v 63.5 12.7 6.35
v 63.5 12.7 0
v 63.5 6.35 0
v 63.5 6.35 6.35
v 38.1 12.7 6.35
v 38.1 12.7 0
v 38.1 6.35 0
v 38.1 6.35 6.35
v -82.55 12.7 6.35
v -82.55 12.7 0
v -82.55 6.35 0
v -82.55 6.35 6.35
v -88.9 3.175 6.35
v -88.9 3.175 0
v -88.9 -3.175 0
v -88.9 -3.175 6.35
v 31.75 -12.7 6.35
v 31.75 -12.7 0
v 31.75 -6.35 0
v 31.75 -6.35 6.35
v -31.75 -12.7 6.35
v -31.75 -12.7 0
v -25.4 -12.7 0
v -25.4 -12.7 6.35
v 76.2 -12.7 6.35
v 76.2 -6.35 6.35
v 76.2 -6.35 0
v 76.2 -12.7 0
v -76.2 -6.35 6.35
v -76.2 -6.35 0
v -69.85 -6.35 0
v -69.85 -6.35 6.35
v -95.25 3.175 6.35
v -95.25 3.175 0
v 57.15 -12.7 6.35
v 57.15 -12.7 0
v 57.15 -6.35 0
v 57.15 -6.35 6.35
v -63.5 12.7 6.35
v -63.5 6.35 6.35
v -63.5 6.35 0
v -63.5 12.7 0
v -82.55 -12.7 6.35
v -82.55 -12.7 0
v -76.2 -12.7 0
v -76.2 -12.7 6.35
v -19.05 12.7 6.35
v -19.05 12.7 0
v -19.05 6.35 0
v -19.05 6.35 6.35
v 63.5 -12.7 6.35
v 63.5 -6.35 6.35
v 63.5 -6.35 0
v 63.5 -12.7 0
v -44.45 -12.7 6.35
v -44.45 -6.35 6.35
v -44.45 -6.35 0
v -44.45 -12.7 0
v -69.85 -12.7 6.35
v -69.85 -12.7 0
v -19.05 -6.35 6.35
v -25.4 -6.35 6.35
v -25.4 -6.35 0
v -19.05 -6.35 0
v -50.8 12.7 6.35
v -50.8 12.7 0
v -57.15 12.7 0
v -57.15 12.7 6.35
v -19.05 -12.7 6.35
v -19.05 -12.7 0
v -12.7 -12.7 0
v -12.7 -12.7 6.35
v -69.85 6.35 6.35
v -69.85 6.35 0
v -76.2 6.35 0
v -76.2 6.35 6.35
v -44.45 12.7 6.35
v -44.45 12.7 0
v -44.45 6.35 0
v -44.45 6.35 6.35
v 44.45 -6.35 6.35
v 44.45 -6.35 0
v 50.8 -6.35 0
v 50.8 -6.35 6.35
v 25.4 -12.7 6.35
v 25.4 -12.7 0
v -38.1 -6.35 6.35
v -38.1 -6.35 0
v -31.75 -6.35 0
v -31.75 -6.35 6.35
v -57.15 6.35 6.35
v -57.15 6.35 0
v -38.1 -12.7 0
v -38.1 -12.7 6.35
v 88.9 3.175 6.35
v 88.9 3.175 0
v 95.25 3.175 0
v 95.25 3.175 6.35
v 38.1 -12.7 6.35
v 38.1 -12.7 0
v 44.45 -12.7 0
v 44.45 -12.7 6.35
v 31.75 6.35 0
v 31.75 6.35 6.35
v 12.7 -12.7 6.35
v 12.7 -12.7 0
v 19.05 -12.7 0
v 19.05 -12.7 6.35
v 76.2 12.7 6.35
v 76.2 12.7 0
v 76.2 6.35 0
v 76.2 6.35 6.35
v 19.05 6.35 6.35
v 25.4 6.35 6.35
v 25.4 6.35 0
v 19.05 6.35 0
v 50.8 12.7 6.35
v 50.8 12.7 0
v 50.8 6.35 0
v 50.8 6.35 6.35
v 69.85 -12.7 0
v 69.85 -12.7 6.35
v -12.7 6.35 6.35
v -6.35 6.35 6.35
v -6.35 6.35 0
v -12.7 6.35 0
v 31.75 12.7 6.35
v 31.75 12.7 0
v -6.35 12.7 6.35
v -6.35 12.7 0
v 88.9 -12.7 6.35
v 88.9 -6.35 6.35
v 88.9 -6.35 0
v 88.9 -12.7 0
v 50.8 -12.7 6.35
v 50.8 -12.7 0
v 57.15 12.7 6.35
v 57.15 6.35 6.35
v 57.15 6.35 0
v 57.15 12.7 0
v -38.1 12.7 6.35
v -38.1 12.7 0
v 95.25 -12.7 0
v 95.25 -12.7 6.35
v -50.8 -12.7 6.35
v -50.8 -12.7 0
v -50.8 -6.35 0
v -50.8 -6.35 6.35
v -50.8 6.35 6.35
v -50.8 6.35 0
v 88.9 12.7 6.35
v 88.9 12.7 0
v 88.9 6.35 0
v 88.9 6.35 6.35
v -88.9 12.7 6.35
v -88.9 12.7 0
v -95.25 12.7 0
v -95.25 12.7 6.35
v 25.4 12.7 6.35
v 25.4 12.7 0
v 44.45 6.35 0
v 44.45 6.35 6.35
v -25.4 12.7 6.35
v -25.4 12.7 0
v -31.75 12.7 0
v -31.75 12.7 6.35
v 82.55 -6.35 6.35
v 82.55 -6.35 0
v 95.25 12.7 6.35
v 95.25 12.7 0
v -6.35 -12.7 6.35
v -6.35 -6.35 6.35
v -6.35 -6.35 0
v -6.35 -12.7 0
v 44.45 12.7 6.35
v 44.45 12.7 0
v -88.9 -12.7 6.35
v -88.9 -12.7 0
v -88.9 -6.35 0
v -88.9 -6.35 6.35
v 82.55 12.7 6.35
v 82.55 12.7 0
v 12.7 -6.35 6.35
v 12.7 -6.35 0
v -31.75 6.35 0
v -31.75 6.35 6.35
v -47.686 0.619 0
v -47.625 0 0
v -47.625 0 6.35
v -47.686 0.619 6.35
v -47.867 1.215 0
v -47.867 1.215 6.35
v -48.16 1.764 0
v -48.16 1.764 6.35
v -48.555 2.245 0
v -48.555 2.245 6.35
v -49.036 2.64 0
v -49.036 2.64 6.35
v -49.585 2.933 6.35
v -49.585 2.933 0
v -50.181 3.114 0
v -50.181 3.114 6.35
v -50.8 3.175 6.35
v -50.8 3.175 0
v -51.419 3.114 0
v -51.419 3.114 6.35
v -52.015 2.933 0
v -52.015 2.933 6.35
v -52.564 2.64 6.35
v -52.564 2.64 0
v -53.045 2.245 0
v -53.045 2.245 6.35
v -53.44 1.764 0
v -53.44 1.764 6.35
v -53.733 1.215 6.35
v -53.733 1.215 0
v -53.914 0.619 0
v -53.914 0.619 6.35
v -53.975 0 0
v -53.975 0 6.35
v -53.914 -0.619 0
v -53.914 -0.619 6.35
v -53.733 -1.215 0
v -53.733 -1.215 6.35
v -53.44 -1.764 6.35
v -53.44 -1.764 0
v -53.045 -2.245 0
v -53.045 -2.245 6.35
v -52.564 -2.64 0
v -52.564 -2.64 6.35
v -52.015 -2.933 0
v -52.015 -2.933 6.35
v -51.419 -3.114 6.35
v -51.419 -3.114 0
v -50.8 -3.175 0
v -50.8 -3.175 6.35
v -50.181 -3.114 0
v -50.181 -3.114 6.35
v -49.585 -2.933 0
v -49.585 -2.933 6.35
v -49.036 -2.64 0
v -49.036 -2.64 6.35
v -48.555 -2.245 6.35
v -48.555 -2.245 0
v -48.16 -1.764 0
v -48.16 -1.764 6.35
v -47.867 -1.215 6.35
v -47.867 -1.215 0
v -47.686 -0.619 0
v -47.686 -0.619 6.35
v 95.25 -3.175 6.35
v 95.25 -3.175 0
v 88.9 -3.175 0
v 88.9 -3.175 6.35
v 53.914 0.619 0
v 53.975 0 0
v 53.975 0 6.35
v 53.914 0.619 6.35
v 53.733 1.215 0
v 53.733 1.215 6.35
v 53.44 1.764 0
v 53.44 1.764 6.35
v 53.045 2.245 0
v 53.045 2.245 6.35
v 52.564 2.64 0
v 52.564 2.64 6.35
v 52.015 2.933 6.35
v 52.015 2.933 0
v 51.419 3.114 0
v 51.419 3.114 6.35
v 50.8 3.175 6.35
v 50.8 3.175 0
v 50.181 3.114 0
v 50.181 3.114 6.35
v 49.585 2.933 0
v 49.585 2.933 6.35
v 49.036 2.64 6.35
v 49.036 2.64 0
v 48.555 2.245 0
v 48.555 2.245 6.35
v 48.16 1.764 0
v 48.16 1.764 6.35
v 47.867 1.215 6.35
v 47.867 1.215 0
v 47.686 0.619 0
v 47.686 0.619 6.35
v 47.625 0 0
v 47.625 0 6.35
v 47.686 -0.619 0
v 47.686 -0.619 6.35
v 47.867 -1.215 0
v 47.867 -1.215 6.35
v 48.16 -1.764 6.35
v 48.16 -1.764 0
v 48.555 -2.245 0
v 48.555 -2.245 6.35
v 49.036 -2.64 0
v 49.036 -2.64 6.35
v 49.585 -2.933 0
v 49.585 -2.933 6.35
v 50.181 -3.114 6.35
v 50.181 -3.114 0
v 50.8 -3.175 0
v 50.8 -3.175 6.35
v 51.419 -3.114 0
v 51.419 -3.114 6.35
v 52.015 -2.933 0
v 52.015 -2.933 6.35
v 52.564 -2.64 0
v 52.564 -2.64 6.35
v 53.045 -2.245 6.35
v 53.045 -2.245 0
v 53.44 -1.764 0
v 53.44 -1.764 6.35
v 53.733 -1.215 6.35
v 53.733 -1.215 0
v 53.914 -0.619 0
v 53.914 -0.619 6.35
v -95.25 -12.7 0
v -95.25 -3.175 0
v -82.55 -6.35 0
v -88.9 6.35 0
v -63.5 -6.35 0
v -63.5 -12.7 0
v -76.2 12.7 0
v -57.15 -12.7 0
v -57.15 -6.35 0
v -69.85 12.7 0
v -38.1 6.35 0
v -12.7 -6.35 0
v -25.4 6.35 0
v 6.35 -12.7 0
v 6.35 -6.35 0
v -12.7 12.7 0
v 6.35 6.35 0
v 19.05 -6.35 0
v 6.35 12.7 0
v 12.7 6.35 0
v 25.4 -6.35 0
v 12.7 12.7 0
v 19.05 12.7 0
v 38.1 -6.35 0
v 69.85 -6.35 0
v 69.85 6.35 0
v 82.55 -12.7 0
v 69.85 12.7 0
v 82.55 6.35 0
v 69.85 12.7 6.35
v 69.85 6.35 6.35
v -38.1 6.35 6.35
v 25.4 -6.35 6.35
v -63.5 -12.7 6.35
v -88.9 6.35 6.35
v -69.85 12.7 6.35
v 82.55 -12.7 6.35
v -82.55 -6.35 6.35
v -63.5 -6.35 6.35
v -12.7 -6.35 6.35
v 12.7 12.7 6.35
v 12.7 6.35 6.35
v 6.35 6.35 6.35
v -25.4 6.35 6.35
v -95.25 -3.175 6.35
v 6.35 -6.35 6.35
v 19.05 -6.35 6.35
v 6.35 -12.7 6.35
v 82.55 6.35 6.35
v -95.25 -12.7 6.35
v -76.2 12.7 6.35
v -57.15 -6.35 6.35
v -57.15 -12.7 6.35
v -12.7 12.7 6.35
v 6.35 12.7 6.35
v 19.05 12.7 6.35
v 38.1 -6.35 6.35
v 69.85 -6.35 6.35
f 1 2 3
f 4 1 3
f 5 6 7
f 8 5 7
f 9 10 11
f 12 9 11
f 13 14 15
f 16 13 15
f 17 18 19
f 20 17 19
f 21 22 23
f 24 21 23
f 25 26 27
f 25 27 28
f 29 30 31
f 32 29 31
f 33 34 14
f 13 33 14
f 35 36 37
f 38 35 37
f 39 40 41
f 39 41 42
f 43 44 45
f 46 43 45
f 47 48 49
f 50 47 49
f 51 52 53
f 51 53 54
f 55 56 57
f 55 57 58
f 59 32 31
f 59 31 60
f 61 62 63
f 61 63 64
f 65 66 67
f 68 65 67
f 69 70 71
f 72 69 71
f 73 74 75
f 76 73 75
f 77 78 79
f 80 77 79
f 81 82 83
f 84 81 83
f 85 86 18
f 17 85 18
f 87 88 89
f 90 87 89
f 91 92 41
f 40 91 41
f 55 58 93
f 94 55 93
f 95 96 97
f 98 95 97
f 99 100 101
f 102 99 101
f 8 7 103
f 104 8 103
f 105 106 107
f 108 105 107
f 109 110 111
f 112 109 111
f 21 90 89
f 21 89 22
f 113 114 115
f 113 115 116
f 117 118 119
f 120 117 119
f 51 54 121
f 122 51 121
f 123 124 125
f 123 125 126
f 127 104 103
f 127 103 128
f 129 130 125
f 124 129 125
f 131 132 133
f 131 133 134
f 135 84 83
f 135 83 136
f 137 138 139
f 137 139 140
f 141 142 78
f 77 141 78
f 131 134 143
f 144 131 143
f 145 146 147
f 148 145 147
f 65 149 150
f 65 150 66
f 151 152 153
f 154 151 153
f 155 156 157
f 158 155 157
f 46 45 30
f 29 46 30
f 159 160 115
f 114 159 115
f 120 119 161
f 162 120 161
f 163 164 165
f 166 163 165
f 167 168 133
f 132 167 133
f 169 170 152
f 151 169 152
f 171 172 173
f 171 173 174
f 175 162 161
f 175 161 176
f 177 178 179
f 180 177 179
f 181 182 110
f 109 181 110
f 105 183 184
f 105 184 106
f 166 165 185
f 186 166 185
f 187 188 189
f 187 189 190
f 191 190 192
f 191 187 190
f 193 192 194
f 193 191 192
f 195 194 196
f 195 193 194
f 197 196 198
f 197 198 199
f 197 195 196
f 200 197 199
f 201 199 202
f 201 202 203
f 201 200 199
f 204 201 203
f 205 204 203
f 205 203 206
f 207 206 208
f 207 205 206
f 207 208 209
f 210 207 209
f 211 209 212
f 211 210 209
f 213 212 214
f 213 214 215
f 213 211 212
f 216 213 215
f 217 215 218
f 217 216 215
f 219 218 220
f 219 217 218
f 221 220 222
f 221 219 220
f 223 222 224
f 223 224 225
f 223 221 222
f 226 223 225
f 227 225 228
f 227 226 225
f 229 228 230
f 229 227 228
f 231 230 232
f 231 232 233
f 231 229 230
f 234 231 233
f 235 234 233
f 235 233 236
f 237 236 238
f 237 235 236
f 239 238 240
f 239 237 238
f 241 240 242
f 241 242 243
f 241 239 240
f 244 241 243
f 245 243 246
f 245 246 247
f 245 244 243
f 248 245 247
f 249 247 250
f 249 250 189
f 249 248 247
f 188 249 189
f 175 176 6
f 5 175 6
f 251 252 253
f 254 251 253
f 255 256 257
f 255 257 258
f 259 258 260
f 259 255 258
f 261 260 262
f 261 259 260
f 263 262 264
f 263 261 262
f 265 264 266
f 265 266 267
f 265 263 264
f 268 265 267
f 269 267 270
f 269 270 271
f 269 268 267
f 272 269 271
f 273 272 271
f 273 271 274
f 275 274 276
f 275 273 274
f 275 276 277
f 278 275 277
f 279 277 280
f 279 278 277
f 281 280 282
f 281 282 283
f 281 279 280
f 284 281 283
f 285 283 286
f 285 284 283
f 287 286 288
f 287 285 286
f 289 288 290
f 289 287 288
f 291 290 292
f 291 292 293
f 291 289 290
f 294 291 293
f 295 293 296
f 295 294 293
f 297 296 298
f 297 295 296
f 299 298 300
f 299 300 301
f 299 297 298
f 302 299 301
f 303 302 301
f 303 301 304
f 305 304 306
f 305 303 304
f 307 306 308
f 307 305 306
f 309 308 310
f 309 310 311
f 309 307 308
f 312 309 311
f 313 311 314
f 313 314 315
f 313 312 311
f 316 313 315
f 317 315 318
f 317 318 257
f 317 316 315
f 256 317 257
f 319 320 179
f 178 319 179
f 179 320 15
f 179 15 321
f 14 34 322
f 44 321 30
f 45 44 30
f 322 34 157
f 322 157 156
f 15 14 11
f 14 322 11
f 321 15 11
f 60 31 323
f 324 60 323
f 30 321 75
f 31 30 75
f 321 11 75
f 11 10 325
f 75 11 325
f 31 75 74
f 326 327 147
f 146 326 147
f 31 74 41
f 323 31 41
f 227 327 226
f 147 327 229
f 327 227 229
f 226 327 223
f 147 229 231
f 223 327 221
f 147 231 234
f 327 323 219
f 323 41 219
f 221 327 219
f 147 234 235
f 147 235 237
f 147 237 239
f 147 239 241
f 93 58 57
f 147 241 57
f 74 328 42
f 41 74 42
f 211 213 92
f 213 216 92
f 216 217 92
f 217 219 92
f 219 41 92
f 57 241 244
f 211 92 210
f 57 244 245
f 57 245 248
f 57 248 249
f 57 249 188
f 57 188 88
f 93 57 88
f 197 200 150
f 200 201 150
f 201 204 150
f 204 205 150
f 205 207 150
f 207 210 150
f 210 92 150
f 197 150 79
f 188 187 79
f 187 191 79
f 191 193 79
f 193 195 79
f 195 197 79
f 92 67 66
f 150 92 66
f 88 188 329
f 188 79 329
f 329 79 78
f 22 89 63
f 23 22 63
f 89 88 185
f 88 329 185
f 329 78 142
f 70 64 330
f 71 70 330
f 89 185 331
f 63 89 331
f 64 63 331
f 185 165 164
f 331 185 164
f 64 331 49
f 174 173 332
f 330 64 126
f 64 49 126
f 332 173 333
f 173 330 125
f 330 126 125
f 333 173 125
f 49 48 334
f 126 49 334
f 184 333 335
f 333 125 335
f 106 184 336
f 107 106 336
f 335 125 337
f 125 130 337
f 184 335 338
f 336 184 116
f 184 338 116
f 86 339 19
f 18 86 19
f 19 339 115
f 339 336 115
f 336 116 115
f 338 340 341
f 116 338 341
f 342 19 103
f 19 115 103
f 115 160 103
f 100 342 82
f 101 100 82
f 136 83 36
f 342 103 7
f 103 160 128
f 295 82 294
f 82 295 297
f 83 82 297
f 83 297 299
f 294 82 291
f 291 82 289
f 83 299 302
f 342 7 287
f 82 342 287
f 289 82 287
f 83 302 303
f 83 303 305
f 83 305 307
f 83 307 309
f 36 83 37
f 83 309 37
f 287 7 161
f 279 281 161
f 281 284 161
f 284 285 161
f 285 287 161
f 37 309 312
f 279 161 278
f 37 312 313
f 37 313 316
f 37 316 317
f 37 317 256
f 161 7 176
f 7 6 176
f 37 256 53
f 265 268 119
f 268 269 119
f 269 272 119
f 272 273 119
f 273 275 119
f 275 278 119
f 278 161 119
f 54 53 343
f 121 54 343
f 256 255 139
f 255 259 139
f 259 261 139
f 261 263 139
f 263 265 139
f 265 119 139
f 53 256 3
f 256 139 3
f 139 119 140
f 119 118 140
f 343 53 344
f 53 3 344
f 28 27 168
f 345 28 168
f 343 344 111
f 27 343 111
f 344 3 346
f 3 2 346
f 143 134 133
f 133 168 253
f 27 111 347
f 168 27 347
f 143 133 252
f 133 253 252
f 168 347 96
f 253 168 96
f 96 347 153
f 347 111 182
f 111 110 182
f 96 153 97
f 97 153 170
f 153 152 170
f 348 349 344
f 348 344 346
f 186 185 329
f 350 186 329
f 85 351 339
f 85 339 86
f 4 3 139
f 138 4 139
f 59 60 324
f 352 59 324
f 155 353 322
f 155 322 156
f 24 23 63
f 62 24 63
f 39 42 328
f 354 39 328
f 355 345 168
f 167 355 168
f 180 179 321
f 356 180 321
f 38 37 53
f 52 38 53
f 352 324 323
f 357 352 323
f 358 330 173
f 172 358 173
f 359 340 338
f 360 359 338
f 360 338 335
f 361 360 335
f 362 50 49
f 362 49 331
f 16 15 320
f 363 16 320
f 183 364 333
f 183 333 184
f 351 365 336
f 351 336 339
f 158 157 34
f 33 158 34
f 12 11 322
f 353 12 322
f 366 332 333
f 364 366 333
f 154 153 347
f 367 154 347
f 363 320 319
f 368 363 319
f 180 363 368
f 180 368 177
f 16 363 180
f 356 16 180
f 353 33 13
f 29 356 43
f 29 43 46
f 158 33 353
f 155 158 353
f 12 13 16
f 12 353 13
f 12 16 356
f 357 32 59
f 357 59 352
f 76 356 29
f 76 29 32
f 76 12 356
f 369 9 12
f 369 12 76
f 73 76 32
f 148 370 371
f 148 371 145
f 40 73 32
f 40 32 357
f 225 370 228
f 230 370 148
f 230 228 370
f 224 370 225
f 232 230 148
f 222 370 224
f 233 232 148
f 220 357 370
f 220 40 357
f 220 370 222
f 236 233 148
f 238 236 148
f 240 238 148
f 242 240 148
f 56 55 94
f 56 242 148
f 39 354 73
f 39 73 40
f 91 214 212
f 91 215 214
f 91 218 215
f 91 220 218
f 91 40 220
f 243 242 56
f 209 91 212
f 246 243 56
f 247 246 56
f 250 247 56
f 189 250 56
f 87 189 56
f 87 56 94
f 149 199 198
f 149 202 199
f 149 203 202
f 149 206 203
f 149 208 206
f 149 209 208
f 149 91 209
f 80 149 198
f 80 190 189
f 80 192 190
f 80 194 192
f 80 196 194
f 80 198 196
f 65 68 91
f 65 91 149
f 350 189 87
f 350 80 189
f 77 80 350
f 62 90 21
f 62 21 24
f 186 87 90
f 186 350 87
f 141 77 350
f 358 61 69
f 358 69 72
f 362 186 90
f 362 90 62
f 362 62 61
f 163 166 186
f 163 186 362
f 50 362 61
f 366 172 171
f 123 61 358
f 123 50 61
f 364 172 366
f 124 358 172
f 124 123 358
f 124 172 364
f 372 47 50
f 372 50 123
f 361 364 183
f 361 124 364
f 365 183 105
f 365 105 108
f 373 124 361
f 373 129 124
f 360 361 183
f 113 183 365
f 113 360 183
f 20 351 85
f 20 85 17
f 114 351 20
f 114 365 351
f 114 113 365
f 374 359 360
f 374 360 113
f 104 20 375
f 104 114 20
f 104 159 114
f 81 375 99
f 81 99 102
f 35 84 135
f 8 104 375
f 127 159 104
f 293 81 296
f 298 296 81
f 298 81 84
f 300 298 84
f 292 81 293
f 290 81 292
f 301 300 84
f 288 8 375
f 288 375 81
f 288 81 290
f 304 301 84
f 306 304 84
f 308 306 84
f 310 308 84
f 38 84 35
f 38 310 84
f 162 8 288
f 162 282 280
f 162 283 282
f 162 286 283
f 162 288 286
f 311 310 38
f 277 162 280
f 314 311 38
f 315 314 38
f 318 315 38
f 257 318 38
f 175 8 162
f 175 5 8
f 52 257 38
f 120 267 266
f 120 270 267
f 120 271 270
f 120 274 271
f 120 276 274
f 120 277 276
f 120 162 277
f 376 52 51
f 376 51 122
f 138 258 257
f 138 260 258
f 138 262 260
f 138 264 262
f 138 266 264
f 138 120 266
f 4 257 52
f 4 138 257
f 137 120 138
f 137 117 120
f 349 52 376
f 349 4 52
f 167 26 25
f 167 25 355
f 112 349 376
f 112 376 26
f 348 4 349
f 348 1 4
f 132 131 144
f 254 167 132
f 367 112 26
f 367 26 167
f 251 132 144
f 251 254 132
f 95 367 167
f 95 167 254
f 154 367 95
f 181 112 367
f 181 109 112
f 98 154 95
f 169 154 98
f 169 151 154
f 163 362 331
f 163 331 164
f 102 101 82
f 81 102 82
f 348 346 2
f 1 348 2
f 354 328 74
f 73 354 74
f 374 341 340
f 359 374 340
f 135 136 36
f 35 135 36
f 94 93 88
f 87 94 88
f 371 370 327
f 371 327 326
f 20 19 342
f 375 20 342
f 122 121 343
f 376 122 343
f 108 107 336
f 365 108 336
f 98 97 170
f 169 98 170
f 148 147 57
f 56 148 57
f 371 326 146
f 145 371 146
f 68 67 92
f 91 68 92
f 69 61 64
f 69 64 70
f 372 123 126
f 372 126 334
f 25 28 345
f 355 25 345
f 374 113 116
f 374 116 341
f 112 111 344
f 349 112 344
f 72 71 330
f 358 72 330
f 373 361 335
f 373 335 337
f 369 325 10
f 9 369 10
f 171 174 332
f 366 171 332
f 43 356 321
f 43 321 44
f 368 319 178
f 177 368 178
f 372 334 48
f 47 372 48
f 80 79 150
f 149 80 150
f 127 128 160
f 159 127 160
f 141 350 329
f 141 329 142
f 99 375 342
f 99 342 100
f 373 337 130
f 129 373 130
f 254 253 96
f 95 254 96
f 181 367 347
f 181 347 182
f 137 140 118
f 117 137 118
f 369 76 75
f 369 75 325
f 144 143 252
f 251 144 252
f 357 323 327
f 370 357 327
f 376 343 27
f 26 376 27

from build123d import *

# Parameters (mm, degrees)
SKETCH1_R           = 3.175
BOSS_EXTRUDE1_DEPTH = 6.35


with BuildPart() as part:
    # Sketch1 → Boss-Extrude1 (new body)
    with BuildSketch(Plane.XY):
        Polygon((-88.9, 12.7), (-95.25, 12.7), (-95.25, 3.175), (-88.9, 3.175), (-88.9, -3.175), (-95.25, -3.175), (-95.25, -12.7), (-88.9, -12.7), (-88.9, -6.35), (-82.55, -6.35), (-82.55, -12.7), (-76.2, -12.7), (-76.2, -6.35), (-69.85, -6.35), (-69.85, -12.7), (-63.5, -12.7), (-63.5, -6.35), (-57.15, -6.35), (-57.15, -12.7), (-50.8, -12.7), (-50.8, -6.35), (-44.45, -6.35), (-44.45, -12.7), (-38.1, -12.7), (-38.1, -6.35), (-31.75, -6.35), (-31.75, -12.7), (-25.4, -12.7), (-25.4, -6.35), (-19.05, -6.35), (-19.05, -12.7), (-12.7, -12.7), (-12.7, -6.35), (-6.35, -6.35), (-6.35, -12.7), (6.35, -12.7), (6.35, -6.35), (12.7, -6.35), (12.7, -12.7), (19.05, -12.7), (19.05, -6.35), (25.4, -6.35), (25.4, -12.7), (31.75, -12.7), (31.75, -6.35), (38.1, -6.35), (38.1, -12.7), (44.45, -12.7), (44.45, -6.35), (50.8, -6.35), (50.8, -12.7), (57.15, -12.7), (57.15, -6.35), (63.5, -6.35), (63.5, -12.7), (69.85, -12.7), (69.85, -6.35), (76.2, -6.35), (76.2, -12.7), (82.55, -12.7), (82.55, -6.35), (88.9, -6.35), (88.9, -12.7), (95.25, -12.7), (95.25, -3.175), (88.9, -3.175), (88.9, 3.175), (95.25, 3.175), (95.25, 12.7), (88.9, 12.7), (88.9, 6.35), (82.55, 6.35), (82.55, 12.7), (76.2, 12.7), (76.2, 6.35), (69.85, 6.35), (69.85, 12.7), (63.5, 12.7), (63.5, 6.35), (57.15, 6.35), (57.15, 12.7), (50.8, 12.7), (50.8, 6.35), (44.45, 6.35), (44.45, 12.7), (38.1, 12.7), (38.1, 6.35), (31.75, 6.35), (31.75, 12.7), (25.4, 12.7), (25.4, 6.35), (19.05, 6.35), (19.05, 12.7), (12.7, 12.7), (12.7, 6.35), (6.35, 6.35), (6.35, 12.7), (-6.35, 12.7), (-6.35, 6.35), (-12.7, 6.35), (-12.7, 12.7), (-19.05, 12.7), (-19.05, 6.35), (-25.4, 6.35), (-25.4, 12.7), (-31.75, 12.7), (-31.75, 6.35), (-38.1, 6.35), (-38.1, 12.7), (-44.45, 12.7), (-44.45, 6.35), (-50.8, 6.35), (-50.8, 12.7), (-57.15, 12.7), (-57.15, 6.35), (-63.5, 6.35), (-63.5, 12.7), (-69.85, 12.7), (-69.85, 6.35), (-76.2, 6.35), (-76.2, 12.7), (-82.55, 12.7), (-82.55, 6.35), (-88.9, 6.35), align=None)
        with Locations((-50.8, 0)):
            Circle(SKETCH1_R, mode=Mode.SUBTRACT)
        with Locations((50.8, 0)):
            Circle(SKETCH1_R, mode=Mode.SUBTRACT)
    extrude(amount=BOSS_EXTRUDE1_DEPTH)


solid = part.part
